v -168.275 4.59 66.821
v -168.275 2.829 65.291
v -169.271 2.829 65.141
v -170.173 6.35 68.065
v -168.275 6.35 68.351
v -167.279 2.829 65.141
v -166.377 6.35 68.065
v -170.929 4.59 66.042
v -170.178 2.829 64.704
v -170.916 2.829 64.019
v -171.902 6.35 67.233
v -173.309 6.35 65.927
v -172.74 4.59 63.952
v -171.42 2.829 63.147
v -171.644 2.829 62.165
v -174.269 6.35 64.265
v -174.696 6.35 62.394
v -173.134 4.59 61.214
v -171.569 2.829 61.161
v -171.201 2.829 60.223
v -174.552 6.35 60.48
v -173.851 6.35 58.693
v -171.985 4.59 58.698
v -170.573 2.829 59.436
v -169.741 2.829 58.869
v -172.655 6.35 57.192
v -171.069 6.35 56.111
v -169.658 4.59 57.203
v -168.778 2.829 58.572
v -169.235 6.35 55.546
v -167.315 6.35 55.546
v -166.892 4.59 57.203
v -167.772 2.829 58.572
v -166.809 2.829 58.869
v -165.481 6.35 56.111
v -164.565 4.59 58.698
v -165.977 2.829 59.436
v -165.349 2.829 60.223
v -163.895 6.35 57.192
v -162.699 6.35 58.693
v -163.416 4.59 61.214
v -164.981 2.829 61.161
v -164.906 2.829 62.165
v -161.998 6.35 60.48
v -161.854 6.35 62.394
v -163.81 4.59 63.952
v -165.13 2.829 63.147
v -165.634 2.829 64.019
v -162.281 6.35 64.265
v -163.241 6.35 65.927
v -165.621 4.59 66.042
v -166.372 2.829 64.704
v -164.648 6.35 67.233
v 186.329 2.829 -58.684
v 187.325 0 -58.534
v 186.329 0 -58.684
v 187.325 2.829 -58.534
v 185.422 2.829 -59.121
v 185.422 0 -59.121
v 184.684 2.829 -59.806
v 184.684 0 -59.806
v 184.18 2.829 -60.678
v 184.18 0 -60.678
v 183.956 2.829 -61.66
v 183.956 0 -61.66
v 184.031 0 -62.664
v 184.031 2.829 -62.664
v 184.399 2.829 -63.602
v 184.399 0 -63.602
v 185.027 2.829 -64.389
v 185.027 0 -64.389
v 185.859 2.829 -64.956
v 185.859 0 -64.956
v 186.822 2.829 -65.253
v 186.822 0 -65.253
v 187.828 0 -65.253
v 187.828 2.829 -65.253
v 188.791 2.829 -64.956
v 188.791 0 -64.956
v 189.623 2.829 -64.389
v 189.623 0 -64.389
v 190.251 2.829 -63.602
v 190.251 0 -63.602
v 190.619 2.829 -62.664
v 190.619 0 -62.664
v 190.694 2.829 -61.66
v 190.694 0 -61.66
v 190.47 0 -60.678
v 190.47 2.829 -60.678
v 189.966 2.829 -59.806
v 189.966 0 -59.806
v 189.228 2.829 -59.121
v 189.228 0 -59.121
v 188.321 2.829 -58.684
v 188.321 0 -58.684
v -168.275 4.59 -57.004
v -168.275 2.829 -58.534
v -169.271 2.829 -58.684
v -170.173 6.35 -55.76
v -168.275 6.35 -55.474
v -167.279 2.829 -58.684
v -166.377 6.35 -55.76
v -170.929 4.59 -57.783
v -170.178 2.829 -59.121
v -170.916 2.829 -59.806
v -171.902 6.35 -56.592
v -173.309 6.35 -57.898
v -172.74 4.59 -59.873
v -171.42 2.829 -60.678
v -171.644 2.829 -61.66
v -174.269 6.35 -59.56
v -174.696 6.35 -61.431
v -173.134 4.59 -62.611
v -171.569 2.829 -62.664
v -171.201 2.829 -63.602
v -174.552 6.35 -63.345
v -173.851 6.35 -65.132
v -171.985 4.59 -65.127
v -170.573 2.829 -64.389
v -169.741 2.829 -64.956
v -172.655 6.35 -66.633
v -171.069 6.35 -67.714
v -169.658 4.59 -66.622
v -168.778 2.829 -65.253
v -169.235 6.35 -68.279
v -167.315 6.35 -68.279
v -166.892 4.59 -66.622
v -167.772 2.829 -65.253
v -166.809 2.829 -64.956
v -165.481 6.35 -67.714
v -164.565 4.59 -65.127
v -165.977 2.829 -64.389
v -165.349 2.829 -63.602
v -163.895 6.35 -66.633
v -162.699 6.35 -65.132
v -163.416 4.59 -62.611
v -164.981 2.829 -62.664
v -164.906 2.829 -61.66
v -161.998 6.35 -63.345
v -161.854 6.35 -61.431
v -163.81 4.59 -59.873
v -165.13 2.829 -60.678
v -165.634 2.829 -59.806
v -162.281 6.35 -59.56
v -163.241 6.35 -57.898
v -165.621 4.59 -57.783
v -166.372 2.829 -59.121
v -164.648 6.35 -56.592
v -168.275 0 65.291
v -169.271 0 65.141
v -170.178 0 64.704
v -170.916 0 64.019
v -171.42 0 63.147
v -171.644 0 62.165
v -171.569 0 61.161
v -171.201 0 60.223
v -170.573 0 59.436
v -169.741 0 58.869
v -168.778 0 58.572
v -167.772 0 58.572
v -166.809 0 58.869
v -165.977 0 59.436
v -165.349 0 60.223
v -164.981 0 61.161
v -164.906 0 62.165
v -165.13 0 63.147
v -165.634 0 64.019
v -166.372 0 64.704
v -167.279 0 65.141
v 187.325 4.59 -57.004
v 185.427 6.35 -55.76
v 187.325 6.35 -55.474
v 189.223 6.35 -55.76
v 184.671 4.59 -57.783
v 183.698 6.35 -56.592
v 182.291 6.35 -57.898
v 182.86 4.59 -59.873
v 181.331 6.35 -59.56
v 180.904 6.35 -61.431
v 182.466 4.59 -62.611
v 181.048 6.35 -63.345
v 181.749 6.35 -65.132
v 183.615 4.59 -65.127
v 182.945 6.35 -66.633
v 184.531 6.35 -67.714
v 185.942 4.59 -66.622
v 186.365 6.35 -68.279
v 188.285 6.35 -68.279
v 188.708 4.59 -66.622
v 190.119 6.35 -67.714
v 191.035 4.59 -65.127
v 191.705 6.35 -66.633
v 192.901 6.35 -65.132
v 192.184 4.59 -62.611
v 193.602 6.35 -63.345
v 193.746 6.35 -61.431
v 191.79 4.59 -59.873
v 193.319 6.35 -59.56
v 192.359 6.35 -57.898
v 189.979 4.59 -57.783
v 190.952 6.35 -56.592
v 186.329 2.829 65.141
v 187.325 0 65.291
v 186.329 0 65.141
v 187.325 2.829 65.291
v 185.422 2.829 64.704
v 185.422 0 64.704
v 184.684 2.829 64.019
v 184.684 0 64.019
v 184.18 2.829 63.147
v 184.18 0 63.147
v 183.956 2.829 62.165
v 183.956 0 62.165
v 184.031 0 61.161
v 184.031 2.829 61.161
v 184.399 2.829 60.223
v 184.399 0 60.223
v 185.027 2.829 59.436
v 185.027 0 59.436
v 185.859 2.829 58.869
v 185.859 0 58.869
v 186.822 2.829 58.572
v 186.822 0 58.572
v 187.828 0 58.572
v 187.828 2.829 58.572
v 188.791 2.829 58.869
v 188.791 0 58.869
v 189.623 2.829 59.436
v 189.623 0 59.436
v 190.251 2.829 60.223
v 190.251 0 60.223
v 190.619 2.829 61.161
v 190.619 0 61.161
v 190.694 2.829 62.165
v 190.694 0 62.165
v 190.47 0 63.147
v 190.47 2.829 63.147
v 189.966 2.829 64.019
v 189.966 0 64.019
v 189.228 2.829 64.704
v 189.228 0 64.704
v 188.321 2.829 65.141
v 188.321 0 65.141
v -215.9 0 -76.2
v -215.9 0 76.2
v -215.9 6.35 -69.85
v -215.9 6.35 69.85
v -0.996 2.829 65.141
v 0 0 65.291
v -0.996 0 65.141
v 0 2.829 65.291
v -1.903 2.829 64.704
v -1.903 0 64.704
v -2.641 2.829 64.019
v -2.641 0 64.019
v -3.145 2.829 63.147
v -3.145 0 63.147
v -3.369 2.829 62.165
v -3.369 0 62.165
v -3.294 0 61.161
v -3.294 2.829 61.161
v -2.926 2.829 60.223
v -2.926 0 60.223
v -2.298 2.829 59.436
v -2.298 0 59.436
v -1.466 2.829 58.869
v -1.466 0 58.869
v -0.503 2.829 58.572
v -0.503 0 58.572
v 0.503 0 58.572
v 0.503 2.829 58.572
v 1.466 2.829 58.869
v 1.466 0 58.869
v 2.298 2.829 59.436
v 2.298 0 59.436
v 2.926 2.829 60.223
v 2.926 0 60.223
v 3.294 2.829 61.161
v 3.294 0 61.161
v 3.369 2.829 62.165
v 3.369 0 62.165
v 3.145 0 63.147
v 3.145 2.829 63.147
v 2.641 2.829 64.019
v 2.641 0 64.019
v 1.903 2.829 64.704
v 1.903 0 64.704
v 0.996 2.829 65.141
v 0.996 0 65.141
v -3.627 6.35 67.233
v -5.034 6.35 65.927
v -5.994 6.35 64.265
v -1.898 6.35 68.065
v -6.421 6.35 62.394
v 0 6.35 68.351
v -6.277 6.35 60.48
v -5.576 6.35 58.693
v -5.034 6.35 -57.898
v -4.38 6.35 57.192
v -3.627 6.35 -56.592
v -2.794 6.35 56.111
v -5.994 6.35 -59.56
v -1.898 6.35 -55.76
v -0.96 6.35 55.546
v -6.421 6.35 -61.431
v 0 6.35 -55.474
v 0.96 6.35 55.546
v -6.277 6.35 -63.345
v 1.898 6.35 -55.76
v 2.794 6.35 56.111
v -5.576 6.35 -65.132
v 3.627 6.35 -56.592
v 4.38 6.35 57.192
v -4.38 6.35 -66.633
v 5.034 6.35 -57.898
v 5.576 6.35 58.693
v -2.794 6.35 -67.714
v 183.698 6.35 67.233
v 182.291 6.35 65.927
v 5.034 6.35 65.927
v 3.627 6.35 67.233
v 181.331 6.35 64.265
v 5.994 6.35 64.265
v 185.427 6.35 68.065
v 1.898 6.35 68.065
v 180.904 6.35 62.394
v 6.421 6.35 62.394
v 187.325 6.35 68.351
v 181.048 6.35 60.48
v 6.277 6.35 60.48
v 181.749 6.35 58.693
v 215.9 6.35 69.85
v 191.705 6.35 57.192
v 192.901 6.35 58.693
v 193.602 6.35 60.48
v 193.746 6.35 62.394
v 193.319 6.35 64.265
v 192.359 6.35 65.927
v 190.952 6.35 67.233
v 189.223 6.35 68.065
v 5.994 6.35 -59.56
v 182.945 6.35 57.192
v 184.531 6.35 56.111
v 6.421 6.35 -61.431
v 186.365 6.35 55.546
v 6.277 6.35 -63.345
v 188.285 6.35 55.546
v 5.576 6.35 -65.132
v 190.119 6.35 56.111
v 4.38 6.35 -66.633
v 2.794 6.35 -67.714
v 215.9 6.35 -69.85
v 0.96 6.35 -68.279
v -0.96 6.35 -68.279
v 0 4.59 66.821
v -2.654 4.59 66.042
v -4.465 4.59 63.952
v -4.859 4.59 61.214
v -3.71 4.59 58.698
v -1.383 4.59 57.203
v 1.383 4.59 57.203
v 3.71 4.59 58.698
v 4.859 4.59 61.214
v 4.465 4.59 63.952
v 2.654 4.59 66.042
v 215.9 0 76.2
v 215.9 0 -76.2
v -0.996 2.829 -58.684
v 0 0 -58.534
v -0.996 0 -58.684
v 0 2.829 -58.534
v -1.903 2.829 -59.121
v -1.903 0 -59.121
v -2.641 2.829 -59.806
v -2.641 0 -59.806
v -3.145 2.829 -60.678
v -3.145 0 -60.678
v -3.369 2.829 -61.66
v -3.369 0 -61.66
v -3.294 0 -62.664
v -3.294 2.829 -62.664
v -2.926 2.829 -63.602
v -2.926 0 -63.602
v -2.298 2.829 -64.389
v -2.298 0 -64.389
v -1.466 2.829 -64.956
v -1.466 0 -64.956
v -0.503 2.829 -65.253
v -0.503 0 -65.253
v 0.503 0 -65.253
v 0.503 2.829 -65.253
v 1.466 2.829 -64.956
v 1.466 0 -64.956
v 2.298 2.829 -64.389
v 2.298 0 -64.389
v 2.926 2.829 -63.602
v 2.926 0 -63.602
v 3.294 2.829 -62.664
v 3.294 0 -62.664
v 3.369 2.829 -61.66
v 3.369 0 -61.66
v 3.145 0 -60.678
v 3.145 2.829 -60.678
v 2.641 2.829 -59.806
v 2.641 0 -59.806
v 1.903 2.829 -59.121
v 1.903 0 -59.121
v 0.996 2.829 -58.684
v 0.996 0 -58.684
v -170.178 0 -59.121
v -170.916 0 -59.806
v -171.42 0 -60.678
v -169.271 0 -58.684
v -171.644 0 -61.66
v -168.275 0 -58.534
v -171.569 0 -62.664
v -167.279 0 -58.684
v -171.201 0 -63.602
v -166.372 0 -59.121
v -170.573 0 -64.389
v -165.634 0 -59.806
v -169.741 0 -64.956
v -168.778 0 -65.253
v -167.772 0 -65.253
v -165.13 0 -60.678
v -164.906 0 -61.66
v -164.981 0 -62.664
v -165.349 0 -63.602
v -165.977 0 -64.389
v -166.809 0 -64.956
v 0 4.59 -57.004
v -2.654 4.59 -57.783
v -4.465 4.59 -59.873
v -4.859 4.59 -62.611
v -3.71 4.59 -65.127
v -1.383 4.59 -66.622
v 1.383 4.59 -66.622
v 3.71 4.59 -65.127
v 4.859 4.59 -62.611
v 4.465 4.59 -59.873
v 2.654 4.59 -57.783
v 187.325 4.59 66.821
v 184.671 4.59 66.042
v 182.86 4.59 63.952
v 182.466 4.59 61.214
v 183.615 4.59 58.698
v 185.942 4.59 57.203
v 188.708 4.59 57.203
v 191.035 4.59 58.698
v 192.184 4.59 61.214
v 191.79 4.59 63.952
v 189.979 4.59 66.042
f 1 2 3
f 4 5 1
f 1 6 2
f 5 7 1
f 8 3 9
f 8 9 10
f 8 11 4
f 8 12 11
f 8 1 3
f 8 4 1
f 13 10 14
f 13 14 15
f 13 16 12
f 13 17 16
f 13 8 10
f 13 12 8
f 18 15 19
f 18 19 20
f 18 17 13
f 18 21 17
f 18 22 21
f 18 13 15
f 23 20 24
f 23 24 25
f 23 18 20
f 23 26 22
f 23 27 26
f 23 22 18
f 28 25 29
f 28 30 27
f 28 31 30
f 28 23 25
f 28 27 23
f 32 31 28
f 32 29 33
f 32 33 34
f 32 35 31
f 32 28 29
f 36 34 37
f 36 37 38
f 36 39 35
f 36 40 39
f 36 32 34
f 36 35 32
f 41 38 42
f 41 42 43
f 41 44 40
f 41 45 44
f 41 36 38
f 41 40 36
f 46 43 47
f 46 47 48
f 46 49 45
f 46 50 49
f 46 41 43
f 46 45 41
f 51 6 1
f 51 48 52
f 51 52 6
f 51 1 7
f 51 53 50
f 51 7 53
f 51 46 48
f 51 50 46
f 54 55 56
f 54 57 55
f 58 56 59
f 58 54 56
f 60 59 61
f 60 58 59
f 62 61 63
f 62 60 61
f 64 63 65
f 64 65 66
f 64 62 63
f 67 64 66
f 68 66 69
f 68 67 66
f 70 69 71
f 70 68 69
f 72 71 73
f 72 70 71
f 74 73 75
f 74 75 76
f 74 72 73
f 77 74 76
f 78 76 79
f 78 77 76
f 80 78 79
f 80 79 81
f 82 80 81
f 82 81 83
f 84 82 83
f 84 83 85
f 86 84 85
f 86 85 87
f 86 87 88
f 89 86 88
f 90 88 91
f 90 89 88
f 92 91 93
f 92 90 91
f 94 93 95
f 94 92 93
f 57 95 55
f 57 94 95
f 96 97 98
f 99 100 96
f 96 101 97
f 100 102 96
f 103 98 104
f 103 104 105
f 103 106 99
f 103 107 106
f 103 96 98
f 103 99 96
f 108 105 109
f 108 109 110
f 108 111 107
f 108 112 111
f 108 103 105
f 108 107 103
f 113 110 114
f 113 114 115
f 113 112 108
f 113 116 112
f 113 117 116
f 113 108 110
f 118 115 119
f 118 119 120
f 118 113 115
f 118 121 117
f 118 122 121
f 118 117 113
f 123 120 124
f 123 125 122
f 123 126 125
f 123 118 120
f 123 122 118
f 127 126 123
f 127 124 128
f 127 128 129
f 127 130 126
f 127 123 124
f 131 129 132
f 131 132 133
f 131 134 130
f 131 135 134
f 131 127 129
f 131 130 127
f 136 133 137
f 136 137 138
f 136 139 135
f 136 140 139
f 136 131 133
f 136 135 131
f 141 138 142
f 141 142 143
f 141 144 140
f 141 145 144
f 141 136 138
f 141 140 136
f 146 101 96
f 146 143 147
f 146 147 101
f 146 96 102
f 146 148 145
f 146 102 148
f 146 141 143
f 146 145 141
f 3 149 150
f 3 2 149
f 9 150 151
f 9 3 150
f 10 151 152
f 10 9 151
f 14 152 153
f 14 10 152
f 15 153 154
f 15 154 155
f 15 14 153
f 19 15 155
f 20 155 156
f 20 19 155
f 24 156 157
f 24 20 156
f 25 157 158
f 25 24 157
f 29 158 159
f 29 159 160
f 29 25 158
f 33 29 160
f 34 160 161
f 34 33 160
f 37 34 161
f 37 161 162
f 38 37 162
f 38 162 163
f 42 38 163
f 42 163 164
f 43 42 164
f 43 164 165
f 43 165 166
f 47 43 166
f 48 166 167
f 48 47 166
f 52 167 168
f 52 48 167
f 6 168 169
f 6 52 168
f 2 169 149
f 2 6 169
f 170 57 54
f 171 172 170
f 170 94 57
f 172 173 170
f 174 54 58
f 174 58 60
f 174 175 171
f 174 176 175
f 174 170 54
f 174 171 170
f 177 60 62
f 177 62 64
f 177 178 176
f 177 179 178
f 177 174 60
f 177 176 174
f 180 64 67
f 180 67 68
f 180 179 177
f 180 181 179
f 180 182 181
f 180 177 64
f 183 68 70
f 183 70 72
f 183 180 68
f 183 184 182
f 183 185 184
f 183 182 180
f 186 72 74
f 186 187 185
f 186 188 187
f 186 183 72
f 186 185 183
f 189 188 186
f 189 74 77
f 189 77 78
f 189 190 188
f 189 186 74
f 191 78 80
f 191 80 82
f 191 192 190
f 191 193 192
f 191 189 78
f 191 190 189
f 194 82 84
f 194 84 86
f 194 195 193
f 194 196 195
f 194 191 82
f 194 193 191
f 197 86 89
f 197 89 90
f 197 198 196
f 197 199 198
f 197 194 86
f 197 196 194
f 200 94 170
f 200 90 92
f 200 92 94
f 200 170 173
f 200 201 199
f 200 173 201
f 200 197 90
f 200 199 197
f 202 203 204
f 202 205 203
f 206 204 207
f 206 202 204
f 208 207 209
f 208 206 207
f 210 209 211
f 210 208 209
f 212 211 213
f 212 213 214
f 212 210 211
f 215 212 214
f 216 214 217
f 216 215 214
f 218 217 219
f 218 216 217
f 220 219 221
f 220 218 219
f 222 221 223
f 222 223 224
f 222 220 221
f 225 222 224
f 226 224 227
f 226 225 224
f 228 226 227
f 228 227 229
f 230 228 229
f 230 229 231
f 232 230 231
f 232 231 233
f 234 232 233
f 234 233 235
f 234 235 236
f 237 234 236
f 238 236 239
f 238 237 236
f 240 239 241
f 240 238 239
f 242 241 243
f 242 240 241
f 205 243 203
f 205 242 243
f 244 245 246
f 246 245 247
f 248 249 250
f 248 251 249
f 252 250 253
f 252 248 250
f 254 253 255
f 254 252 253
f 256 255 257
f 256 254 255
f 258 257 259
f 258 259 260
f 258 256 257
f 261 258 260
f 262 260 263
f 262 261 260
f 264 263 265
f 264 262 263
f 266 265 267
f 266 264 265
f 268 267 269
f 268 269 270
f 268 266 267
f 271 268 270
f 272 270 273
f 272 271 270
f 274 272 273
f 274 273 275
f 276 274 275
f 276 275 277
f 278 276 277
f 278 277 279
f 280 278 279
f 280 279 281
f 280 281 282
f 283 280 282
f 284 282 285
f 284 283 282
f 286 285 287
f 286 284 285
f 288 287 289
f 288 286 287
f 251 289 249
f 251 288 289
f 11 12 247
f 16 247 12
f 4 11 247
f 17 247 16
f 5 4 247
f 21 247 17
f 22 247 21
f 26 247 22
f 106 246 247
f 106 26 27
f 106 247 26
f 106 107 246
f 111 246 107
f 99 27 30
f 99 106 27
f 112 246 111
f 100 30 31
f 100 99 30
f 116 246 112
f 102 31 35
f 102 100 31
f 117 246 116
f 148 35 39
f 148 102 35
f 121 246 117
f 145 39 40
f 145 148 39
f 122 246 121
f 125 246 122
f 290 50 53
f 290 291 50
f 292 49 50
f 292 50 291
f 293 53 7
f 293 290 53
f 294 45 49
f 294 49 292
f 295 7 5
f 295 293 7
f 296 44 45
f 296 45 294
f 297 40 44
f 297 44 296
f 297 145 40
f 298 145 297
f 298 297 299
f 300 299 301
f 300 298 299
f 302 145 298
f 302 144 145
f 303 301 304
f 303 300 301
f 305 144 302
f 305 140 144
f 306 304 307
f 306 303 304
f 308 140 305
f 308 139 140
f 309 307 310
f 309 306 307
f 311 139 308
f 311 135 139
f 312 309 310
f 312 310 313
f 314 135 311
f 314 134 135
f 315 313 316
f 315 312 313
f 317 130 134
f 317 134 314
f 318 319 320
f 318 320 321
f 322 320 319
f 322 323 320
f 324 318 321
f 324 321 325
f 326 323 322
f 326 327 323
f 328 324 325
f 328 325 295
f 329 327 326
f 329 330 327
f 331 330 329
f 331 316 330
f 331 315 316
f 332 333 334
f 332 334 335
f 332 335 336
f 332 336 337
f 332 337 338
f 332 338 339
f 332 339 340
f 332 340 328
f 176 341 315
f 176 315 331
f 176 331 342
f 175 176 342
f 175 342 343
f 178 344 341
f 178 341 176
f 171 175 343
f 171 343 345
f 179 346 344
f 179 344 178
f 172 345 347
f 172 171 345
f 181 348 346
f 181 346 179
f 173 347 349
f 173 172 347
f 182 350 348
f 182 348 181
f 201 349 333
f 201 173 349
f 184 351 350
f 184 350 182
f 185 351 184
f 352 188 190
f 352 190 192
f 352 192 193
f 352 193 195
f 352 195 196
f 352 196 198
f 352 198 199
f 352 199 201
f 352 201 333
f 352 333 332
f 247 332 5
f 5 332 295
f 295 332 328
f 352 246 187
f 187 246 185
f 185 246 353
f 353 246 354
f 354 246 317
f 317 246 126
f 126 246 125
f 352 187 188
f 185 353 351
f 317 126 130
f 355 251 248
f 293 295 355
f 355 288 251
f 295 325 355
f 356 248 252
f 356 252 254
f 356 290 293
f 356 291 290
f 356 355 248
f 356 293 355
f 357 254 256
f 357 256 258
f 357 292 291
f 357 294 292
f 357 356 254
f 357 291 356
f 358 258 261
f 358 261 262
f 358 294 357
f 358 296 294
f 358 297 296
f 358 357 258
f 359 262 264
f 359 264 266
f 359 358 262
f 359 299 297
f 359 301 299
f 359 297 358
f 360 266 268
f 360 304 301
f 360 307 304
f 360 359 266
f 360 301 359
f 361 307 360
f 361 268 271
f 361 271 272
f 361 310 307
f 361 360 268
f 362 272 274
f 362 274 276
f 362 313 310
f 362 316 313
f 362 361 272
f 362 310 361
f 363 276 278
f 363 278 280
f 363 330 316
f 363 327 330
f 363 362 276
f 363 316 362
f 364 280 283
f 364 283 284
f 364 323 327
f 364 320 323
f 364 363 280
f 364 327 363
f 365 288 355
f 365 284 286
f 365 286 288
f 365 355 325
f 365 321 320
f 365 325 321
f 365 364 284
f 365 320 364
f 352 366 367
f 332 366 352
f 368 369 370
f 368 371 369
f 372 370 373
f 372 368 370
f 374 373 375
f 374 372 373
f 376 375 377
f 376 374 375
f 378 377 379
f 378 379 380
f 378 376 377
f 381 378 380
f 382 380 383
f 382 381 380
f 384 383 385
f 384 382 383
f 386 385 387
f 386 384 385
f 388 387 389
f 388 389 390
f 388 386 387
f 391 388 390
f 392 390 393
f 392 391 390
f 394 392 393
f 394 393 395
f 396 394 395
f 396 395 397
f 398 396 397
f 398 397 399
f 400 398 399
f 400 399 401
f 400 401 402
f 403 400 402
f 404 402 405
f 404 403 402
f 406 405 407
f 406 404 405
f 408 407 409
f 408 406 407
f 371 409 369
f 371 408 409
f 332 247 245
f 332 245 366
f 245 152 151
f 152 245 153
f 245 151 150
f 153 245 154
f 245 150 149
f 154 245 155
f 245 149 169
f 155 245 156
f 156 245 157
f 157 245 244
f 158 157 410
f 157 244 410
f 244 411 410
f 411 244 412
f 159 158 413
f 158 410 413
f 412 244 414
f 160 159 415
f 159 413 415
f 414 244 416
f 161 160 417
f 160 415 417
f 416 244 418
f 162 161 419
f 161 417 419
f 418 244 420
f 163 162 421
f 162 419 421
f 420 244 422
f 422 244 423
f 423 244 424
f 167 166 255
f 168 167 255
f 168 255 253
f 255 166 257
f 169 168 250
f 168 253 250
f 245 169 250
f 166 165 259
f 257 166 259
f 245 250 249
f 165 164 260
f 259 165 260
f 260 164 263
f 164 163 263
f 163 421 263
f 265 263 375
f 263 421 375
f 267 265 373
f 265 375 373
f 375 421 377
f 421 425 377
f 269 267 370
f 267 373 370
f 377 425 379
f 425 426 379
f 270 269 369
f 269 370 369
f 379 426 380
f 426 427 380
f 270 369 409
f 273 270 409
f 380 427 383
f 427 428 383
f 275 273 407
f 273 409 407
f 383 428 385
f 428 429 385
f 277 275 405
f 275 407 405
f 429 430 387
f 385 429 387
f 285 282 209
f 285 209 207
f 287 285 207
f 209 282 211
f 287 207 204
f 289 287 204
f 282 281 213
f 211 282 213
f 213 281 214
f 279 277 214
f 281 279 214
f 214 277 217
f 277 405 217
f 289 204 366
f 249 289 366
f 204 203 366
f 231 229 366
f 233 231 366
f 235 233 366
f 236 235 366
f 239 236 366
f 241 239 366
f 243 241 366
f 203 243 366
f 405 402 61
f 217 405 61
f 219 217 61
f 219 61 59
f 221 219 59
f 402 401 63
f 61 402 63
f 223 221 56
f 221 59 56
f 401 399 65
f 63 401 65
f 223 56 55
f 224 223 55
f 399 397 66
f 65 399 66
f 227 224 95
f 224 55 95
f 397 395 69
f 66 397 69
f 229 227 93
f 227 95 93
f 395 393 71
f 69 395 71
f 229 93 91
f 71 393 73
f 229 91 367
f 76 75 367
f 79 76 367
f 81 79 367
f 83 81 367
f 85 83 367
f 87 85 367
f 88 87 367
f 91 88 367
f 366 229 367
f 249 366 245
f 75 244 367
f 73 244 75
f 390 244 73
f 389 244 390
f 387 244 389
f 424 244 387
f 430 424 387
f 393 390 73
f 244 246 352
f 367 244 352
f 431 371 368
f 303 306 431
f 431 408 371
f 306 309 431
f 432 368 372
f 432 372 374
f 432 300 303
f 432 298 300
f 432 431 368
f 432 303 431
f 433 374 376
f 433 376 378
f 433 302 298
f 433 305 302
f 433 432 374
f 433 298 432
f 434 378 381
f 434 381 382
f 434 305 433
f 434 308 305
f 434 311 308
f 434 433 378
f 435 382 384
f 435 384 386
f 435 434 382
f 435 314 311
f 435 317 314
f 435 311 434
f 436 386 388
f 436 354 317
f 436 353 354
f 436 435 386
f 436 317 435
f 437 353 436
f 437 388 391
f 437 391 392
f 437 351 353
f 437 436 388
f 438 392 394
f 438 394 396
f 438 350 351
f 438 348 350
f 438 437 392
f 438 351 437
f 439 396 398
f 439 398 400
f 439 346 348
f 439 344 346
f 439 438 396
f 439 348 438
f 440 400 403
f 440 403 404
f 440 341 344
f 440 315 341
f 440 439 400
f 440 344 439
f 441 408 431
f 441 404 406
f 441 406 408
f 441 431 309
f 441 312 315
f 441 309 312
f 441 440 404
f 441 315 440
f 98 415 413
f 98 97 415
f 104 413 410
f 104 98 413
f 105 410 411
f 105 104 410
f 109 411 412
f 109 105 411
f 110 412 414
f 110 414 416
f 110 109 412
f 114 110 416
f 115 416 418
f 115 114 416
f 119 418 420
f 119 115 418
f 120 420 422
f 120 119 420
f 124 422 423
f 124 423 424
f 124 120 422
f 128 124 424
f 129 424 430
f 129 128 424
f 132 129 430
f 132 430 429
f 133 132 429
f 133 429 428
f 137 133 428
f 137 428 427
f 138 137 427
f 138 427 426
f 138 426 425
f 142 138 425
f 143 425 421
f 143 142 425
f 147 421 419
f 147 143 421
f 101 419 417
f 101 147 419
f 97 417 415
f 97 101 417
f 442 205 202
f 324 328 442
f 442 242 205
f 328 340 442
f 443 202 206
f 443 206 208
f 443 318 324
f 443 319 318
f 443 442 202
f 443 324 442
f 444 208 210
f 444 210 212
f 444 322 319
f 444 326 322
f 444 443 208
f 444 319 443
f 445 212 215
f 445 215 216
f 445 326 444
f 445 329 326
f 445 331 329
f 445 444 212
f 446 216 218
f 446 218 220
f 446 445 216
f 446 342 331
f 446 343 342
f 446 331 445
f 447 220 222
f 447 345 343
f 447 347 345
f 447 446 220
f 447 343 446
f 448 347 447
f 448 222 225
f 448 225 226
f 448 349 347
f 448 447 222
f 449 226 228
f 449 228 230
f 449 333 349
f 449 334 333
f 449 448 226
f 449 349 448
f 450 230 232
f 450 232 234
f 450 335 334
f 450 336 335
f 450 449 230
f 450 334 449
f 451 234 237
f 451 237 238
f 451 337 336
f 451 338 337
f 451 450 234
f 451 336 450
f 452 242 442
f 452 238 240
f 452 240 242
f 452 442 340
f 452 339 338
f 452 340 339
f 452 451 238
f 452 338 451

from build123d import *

# Parameters (mm, degrees)
SKETCH1_W                                     = 431.8
SKETCH1_H                                     = 152.4
BOSS_EXTRUDE1_DEPTH                           = 6.35
CHAMFER1_SIZE                                 = 6.35
CSK_FOR_1_4_FLAT_HEAD_MACHINE_SCREW1_AT_COUNT = 2
CSK_FOR_1_4_FLAT_HEAD_MACHINE_SCREW1_AT_PITCH = 187.325
CSK_FOR_1_4_FLAT_HEAD_MACHINE_SCREW1_2_COUNT  = 2
CSK_FOR_1_4_FLAT_HEAD_MACHINE_SCREW1_2_PITCH  = 355.6
CSK_FOR_1_4_FLAT_HEAD_MACHINE_SCREW1_3_COUNT  = 2
CSK_FOR_1_4_FLAT_HEAD_MACHINE_SCREW1_3_PITCH  = 376.542149865
CSK_FOR_1_4_FLAT_HEAD_MACHINE_SCREW1_4_COUNT  = 2
CSK_FOR_1_4_FLAT_HEAD_MACHINE_SCREW1_4_PITCH  = 123.825
CSK_FOR_1_4_FLAT_HEAD_MACHINE_SCREW1_5_COUNT  = 2
CSK_FOR_1_4_FLAT_HEAD_MACHINE_SCREW1_5_PITCH  = 224.551299818


with BuildPart() as part:
    # Sketch1 → Boss-Extrude1 (new body)
    with BuildSketch(Plane(origin=(0, 0, 0), x_dir=(1, 0, 0), z_dir=(0, 1, 0))):
        Rectangle(SKETCH1_W, SKETCH1_H)
    extrude(amount=BOSS_EXTRUDE1_DEPTH)

    # Chamfer1
    chamfer1_edges = [part.edges().sort_by_distance(p)[0] for p in [
        (0, 6.35, 76.2),
        (0, 6.35, -76.2),
    ]]
    chamfer(chamfer1_edges, length=CHAMFER1_SIZE - 0.0001)  # a hair under: the kernel refuses the full size

    # Sketch3 → CSK for 1/4 Flat Head Machine Screw1 (revolve, cut)
    with BuildSketch(Plane(origin=(187.325, 6.35, 61.9125), x_dir=(0, 0, 1), z_dir=(1, 0, 0))):
        Polygon((0, 0), (0, 6.35), (3.3782, 6.35), (3.3782, 3.520932584), (6.4389, 0), align=None)
    csk_for_1_4_flat_head_machine_screw1 = revolve(axis=Axis((187.325, 12.7, 61.9125), (0, -1, 0)), mode=Mode.SUBTRACT)

    # CSK for 1/4 Flat Head Machine Screw1 at: CSK for 1/4 Flat Head Machine Screw1 ×2
    with Locations(*[(-i * CSK_FOR_1_4_FLAT_HEAD_MACHINE_SCREW1_AT_PITCH, 0, 0) for i in range(1, CSK_FOR_1_4_FLAT_HEAD_MACHINE_SCREW1_AT_COUNT)]):
        add(csk_for_1_4_flat_head_machine_screw1, mode=Mode.SUBTRACT)

    # CSK for 1_4 Flat Head Machine Screw1 2: CSK for 1/4 Flat Head Machine Screw1 ×2
    with Locations(*[(-i * CSK_FOR_1_4_FLAT_HEAD_MACHINE_SCREW1_2_PITCH, 0, 0) for i in range(1, CSK_FOR_1_4_FLAT_HEAD_MACHINE_SCREW1_2_COUNT)]):
        add(csk_for_1_4_flat_head_machine_screw1, mode=Mode.SUBTRACT)

    # CSK for 1_4 Flat Head Machine Screw1 3: CSK for 1/4 Flat Head Machine Screw1 ×2
    with Locations(*[Vector(-0.9443829864131722, 0, -0.32884764705458697) * (i * CSK_FOR_1_4_FLAT_HEAD_MACHINE_SCREW1_3_PITCH) for i in range(1, CSK_FOR_1_4_FLAT_HEAD_MACHINE_SCREW1_3_COUNT)]):
        add(csk_for_1_4_flat_head_machine_screw1, mode=Mode.SUBTRACT)

    # CSK for 1_4 Flat Head Machine Screw1 4: CSK for 1/4 Flat Head Machine Screw1 ×2
    with Locations(*[(0, 0, -i * CSK_FOR_1_4_FLAT_HEAD_MACHINE_SCREW1_4_PITCH) for i in range(1, CSK_FOR_1_4_FLAT_HEAD_MACHINE_SCREW1_4_COUNT)]):
        add(csk_for_1_4_flat_head_machine_screw1, mode=Mode.SUBTRACT)

    # CSK for 1_4 Flat Head Machine Screw1 5: CSK for 1/4 Flat Head Machine Screw1 ×2
    with Locations(*[Vector(-0.8342191746462441, 0, -0.5514330137492126) * (i * CSK_FOR_1_4_FLAT_HEAD_MACHINE_SCREW1_5_PITCH) for i in range(1, CSK_FOR_1_4_FLAT_HEAD_MACHINE_SCREW1_5_COUNT)]):
        add(csk_for_1_4_flat_head_machine_screw1, mode=Mode.SUBTRACT)


solid = part.part
